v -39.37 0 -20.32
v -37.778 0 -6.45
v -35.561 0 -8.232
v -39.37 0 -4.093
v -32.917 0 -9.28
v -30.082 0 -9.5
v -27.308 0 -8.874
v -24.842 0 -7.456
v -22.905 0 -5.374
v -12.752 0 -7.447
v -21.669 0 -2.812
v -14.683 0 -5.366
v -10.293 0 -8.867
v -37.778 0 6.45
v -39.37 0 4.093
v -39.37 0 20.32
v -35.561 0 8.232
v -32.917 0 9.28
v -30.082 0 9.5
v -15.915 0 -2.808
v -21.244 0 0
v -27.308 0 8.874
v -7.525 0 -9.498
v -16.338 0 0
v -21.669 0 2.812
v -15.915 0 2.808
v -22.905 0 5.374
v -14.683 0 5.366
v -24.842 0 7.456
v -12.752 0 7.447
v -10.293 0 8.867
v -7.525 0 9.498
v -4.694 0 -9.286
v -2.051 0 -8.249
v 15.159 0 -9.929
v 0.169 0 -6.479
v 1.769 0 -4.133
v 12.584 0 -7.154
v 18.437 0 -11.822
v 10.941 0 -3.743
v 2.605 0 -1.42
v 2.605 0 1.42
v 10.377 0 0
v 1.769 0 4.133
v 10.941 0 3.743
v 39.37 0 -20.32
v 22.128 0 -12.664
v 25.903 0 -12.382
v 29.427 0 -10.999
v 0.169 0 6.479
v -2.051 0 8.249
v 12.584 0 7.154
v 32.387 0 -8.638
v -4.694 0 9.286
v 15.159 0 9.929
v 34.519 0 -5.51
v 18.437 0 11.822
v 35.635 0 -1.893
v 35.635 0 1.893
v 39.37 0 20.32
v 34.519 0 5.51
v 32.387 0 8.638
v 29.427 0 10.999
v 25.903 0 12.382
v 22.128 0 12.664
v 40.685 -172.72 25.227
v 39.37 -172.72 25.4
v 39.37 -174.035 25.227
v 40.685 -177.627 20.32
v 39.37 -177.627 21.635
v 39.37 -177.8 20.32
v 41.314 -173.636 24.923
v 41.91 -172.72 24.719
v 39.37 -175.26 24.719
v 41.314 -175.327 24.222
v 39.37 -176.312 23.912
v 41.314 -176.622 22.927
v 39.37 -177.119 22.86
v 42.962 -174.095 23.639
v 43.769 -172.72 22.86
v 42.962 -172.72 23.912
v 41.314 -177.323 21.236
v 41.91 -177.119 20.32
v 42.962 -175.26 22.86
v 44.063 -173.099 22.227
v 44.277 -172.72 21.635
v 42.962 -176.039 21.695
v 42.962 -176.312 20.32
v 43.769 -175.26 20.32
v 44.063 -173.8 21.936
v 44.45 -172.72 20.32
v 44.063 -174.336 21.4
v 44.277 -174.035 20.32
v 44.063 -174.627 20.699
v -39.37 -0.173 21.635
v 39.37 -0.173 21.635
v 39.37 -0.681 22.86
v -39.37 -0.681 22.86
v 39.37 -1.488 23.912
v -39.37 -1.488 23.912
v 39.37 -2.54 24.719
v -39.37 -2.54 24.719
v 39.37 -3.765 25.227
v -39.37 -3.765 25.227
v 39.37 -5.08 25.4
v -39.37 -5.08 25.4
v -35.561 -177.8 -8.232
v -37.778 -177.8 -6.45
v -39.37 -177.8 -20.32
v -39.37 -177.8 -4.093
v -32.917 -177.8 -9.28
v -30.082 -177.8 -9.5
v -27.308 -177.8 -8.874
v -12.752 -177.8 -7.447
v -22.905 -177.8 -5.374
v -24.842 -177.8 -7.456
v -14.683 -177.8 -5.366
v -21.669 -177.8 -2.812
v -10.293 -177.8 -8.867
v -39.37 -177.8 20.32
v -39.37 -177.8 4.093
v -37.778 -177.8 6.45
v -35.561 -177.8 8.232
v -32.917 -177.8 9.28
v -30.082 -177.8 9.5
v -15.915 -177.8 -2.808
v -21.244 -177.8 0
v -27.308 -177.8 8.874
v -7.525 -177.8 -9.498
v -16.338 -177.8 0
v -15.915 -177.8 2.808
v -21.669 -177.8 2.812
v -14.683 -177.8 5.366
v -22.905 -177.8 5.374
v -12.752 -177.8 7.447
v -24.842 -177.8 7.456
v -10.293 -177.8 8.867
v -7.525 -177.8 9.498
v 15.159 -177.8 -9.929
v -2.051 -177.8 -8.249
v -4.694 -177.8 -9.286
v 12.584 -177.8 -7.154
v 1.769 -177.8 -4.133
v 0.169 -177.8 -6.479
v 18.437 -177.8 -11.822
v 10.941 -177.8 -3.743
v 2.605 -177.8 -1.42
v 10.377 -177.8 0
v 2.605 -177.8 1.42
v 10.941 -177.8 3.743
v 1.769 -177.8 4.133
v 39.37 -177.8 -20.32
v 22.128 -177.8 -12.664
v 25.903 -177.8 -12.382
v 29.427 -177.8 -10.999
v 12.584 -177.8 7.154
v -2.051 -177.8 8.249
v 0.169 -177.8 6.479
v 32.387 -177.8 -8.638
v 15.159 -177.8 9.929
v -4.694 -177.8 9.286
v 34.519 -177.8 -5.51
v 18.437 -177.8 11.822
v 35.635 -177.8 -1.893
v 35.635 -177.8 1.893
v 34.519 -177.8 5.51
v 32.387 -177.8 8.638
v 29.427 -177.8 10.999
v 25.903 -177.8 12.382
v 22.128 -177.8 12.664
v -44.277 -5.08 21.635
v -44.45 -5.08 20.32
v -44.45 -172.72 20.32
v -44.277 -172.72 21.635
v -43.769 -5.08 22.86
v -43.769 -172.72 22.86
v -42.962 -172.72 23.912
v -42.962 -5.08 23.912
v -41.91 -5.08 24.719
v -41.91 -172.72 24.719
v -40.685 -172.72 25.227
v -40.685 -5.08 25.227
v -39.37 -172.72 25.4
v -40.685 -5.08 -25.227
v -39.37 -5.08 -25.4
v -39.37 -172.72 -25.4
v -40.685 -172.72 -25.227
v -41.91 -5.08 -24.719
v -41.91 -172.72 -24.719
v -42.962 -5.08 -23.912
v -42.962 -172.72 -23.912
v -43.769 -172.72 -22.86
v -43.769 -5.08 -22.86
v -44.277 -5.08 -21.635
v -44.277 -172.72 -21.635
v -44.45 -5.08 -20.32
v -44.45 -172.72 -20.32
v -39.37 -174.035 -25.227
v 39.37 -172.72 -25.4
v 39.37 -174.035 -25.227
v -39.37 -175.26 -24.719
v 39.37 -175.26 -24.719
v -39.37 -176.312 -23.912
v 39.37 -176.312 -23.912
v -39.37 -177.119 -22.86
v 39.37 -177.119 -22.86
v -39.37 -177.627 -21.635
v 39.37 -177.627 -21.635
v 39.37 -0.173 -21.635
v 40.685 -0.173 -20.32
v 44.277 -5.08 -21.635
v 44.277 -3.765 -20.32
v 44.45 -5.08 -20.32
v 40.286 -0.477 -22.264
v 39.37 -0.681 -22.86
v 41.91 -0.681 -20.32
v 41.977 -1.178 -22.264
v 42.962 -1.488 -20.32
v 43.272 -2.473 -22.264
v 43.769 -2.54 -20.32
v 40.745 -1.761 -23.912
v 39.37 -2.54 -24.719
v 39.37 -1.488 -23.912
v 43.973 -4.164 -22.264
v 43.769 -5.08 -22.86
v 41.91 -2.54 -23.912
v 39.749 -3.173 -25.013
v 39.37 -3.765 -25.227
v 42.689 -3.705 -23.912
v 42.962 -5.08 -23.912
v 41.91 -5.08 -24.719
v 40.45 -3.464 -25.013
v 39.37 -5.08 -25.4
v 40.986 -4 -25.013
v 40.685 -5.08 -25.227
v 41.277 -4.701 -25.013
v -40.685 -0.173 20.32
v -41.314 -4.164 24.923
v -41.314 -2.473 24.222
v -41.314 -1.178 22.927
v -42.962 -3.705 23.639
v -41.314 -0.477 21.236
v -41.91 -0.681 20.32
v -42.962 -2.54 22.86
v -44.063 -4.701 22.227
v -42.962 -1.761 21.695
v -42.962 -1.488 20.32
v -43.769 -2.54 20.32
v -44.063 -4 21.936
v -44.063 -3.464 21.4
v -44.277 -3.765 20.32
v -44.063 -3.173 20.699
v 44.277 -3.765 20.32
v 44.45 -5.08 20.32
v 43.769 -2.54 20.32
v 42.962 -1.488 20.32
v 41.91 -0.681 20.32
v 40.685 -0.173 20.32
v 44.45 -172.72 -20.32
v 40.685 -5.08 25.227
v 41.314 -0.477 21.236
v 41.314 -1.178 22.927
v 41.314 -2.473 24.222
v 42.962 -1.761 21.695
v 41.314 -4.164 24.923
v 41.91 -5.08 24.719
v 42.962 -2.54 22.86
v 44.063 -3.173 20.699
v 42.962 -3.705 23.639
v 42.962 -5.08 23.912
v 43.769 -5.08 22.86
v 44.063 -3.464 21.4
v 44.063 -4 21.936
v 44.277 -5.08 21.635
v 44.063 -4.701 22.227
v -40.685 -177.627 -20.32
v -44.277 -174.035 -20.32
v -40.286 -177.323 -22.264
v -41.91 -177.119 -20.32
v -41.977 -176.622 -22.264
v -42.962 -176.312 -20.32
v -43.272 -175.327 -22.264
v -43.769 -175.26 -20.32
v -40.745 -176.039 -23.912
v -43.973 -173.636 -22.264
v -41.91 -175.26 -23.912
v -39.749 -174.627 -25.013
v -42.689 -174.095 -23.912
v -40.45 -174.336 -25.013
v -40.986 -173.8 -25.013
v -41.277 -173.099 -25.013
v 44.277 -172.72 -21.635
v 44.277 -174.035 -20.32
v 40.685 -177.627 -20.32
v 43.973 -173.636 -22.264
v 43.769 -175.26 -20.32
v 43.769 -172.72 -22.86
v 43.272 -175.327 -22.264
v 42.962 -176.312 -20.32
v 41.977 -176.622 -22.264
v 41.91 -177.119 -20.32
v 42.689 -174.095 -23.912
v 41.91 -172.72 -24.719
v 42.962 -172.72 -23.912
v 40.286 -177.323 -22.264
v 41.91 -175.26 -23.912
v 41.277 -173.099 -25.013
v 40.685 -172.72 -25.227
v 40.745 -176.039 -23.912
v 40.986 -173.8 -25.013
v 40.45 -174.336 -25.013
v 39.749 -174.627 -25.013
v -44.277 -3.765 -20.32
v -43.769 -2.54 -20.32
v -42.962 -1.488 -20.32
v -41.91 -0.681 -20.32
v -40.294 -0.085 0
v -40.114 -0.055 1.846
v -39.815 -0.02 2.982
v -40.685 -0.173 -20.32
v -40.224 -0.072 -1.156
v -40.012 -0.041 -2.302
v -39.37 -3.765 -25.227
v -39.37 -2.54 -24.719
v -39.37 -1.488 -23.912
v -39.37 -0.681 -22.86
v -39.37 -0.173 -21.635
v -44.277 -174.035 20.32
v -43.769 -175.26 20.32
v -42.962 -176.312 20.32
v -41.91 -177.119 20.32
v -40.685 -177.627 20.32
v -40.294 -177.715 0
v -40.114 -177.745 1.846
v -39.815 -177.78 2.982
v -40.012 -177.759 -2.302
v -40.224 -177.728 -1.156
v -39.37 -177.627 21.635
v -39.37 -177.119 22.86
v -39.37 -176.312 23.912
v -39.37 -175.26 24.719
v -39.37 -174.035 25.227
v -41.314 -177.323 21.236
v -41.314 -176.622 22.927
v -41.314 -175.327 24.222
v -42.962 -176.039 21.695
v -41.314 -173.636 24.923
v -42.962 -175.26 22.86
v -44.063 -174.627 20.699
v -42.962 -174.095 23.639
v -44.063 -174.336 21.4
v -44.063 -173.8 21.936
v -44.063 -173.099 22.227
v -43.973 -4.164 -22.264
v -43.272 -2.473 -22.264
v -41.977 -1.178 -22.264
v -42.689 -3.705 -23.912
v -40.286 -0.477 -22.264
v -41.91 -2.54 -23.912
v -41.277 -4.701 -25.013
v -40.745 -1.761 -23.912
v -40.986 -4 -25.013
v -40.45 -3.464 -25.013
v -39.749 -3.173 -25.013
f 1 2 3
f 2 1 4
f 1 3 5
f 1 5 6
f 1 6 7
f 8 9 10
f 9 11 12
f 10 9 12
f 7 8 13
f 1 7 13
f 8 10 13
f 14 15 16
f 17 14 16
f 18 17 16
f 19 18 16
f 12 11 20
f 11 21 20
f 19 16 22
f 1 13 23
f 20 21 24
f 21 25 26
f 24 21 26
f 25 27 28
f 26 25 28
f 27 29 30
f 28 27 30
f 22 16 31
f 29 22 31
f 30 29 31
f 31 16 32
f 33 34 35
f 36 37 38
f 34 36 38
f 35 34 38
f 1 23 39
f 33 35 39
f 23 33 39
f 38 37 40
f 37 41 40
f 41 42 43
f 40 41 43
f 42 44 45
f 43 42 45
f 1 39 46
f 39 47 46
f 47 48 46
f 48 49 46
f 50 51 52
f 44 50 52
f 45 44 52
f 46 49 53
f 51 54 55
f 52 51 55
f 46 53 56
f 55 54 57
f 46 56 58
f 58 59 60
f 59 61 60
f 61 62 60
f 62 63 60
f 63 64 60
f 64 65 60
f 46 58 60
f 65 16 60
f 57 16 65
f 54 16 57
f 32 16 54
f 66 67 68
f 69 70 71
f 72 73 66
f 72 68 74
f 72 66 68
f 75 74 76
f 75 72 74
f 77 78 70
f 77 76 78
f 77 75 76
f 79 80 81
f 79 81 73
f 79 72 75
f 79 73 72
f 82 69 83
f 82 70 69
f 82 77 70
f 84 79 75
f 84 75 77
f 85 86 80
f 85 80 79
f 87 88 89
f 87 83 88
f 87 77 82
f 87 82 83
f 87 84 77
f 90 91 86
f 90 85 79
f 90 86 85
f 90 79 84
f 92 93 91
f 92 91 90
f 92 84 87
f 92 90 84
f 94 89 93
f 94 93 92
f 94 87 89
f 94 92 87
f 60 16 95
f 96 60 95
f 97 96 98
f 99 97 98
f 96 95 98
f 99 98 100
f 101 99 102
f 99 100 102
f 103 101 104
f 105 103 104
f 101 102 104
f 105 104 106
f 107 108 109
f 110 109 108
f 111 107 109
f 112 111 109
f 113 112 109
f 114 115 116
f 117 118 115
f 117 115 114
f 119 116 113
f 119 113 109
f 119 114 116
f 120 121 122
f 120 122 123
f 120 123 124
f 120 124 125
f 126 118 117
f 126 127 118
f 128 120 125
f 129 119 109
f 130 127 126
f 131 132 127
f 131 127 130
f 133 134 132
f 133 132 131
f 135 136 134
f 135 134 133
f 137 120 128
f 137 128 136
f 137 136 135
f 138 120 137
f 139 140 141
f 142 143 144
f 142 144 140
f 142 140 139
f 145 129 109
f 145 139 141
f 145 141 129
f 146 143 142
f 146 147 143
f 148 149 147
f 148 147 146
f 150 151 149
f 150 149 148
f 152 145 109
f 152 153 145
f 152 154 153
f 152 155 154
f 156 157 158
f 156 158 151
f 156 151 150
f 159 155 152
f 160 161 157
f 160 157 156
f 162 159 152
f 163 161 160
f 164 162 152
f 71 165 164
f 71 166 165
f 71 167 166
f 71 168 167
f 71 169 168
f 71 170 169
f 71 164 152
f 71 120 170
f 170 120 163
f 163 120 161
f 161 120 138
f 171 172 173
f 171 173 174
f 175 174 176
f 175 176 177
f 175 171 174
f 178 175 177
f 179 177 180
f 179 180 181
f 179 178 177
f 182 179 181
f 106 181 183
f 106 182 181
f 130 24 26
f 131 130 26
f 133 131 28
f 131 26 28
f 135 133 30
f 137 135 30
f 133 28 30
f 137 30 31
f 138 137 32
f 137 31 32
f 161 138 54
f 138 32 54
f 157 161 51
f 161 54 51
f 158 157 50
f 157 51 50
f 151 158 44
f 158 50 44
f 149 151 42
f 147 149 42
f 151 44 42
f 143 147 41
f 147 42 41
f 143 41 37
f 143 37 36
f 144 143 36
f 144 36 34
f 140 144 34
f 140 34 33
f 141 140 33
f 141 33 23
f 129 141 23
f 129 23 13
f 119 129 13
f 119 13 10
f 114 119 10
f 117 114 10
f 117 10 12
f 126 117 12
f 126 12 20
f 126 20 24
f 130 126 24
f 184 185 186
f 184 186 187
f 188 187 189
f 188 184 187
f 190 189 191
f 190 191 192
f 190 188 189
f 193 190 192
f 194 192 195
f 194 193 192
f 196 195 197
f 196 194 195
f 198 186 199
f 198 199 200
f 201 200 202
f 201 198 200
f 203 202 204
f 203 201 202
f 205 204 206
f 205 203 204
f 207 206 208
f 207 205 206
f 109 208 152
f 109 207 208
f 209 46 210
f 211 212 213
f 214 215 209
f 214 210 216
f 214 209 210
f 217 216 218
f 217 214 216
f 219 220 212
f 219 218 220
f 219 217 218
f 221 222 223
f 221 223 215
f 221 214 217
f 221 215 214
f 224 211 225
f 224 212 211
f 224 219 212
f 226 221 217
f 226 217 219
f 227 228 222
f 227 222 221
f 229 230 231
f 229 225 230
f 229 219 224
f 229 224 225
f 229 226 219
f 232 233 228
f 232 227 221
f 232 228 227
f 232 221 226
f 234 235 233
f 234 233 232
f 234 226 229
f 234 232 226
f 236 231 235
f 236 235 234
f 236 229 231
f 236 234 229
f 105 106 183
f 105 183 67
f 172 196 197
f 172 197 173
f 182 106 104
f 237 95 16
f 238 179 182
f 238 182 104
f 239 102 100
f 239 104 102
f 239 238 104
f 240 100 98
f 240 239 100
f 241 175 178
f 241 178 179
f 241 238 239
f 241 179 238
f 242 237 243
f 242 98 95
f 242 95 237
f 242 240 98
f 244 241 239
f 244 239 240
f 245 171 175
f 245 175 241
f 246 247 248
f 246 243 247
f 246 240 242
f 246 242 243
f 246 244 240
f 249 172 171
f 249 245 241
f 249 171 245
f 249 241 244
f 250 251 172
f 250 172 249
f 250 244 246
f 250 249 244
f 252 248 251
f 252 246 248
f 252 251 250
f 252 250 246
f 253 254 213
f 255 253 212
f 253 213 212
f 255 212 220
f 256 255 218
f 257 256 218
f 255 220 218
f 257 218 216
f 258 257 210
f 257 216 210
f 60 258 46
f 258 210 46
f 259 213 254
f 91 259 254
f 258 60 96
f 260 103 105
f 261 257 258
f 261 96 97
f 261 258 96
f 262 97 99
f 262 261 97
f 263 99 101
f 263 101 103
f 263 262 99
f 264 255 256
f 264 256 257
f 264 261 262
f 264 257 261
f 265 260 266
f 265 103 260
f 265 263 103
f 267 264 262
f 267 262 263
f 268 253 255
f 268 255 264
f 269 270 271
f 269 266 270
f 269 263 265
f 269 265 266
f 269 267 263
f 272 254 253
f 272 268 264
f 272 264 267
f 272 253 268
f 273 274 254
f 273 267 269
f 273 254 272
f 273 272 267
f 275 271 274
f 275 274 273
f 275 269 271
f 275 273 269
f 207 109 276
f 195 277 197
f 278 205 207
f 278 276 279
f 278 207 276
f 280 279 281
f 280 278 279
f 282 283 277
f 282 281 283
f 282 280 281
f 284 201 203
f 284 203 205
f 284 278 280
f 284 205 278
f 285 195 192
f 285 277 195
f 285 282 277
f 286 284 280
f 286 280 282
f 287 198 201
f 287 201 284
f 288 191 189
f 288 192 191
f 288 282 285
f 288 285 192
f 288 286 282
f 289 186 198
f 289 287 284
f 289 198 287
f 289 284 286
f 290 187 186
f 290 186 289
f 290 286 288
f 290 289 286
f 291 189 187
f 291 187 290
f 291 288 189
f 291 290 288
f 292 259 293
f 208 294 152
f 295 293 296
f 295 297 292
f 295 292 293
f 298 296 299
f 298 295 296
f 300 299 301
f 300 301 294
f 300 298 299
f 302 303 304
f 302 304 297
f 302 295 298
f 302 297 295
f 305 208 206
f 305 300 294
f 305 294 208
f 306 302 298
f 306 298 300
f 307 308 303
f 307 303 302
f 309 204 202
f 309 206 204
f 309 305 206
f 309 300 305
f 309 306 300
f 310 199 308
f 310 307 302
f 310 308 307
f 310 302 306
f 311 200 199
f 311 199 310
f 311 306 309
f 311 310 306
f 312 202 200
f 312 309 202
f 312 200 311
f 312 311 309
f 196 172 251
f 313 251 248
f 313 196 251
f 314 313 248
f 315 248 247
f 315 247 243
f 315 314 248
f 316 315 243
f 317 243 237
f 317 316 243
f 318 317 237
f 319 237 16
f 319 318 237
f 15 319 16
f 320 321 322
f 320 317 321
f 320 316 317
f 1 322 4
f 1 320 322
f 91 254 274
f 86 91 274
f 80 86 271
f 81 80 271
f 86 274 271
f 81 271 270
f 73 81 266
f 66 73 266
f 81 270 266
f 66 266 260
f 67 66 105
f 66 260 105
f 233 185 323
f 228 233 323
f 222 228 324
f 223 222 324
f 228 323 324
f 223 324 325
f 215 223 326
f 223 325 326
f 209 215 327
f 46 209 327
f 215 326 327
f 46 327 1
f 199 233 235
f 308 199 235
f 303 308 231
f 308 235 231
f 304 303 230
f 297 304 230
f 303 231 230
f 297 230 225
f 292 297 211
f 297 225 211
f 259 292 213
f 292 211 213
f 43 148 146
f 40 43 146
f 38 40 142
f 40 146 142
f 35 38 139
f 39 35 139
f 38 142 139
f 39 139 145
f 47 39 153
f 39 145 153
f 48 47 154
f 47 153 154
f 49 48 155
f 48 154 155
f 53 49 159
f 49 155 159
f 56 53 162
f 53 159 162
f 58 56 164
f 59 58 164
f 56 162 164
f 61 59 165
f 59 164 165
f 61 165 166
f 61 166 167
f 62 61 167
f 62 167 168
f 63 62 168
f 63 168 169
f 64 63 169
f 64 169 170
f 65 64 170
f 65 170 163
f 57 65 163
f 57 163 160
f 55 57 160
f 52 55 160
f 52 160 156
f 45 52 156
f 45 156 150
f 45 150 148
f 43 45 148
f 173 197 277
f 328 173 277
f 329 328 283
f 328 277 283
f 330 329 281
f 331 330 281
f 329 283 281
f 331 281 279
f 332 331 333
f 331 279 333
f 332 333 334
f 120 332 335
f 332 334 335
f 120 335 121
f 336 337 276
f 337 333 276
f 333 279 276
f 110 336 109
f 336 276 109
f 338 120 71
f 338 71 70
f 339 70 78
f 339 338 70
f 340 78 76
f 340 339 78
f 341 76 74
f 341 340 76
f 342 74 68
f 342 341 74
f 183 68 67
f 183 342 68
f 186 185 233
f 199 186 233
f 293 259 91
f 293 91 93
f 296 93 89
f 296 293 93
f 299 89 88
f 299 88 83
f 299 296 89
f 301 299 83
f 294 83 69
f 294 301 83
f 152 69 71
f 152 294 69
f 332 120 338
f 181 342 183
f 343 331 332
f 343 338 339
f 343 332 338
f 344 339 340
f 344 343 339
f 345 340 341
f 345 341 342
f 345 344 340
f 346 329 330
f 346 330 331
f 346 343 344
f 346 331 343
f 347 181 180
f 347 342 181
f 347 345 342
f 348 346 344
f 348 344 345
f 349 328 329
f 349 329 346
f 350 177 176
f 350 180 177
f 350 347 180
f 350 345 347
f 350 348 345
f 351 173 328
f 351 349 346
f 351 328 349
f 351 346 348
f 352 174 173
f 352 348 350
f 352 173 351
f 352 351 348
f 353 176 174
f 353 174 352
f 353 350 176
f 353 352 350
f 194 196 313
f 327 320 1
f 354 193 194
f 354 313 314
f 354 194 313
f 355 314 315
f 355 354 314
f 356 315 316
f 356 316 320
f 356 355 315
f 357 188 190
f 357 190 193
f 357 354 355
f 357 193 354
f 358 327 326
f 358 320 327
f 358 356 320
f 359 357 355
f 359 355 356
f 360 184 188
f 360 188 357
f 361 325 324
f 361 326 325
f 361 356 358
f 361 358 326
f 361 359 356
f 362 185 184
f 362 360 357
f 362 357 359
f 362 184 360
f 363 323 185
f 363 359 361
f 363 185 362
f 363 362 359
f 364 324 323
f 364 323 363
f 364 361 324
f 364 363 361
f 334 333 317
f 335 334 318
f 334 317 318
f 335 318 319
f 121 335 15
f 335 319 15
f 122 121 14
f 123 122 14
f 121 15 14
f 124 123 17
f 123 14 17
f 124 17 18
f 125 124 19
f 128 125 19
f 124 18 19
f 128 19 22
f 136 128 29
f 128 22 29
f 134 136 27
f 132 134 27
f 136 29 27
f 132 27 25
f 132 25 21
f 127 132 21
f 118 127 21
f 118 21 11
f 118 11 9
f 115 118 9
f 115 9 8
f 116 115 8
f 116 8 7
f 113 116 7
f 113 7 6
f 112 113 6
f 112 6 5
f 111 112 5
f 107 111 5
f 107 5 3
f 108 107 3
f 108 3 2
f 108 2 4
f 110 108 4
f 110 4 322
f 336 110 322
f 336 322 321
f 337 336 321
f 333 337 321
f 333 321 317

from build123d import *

# Parameters (mm, degrees)
F0_W         = 88.9
F0_H         = 50.8
F1_DEPTH     = 177.8
F3_D         = 19.05
F5_D         = 25.4
F6_T1_DEPTH  = 167.64
F6_T3_DEPTH  = 78.74
F6_T5_DEPTH  = 40.64
F6_S9_W      = 5.08
F6_S9_H      = 5.08
F6_T10_DEPTH = 5.08
F6_S15_W     = 5.08
F6_S15_H     = 5.08
F6_T16_DEPTH = 5.08
F6_S21_W     = 5.08
F6_S21_H     = 5.08
F6_T22_DEPTH = 5.08
F6_S27_W     = 5.08
F6_S27_H     = 5.08
F6_T28_DEPTH = 5.08
F6_S33_W     = 5.08
F6_S33_H     = 5.08
F6_T34_DEPTH = 5.08
F6_S39_W     = 5.08
F6_S39_H     = 5.08
F6_T40_DEPTH = 5.08
F6_S45_W     = 5.08
F6_S45_H     = 5.08
F6_T46_DEPTH = 5.08
F6_S51_W     = 5.08
F6_S51_H     = 5.08
F6_T52_DEPTH = 5.08


# Not quite as in the source:
# - a fillet or chamfer that OpenCascade refuses, or shapes differently, is made with other operations: its cross-section is extruded or revolved along the edge and cut away or added


with BuildPart() as f1:
    # F0 (on Front) → F1 (new body)
    with BuildSketch(Plane.XZ):
        Rectangle(F0_W, F0_H)
    extrude(amount=F1_DEPTH)

    # F3 (through all)
    with Locations(Plane.XZ.offset(177.8)):
        with Locations((-30.7692382485, 0), (-6.8131890148, 0)):
            Hole(F3_D / 2)

    # F5 (through all)
    with Locations(Plane(origin=(0, 0, 0), x_dir=(1, 0, 0), z_dir=(0, 1, 0))):
        with Locations((23.0769272894, 0)):
            Hole(F5_D / 2)

    # F6: fillet of radius 5.08 on 12 edges, made by hand

    # F6_s2 → F6_t1 (cut)
    with BuildSketch(Plane.XZ.offset(5.08)):
        with BuildLine():
            ThreePointArc((44.45, 20.32), (42.9621024484, 23.9121024484), (39.37, 25.4))
            Line((39.37, 25.4), (44.45, 25.4))
            Line((44.45, 25.4), (44.45, 20.32))
        make_face()
        with BuildLine():
            ThreePointArc((-44.45, 20.32), (-42.9621024484, 23.9121024484), (-39.37, 25.4))
            Line((-39.37, 25.4), (-44.45, 25.4))
            Line((-44.45, 25.4), (-44.45, 20.32))
        make_face()
        with BuildLine():
            ThreePointArc((39.37, -25.4), (42.9621024484, -23.9121024484), (44.45, -20.32))
            Line((44.45, -20.32), (44.45, -25.4))
            Line((44.45, -25.4), (39.37, -25.4))
        make_face()
        with BuildLine():
            ThreePointArc((-39.37, -25.4), (-42.9621024484, -23.9121024484), (-44.45, -20.32))
            Line((-44.45, -20.32), (-44.45, -25.4))
            Line((-44.45, -25.4), (-39.37, -25.4))
        make_face()
    extrude(amount=F6_T1_DEPTH, mode=Mode.SUBTRACT)

    # F6_s4 → F6_t3 (cut)
    with BuildSketch(Plane.YZ.offset(-39.37)):
        with BuildLine():
            ThreePointArc((0, 20.32), (-1.4878975516, 23.9121024484), (-5.08, 25.4))
            Line((-5.08, 25.4), (0, 25.4))
            Line((0, 25.4), (0, 20.32))
        make_face()
        with BuildLine():
            ThreePointArc((-177.8, 20.32), (-176.3121024484, 23.9121024484), (-172.72, 25.4))
            Line((-172.72, 25.4), (-177.8, 25.4))
            Line((-177.8, 25.4), (-177.8, 20.32))
        make_face()
        with BuildLine():
            ThreePointArc((-5.08, -25.4), (-1.4878975516, -23.9121024484), (0, -20.32))
            Line((0, -20.32), (0, -25.4))
            Line((0, -25.4), (-5.08, -25.4))
        make_face()
        with BuildLine():
            ThreePointArc((-172.72, -25.4), (-176.3121024484, -23.9121024484), (-177.8, -20.32))
            Line((-177.8, -20.32), (-177.8, -25.4))
            Line((-177.8, -25.4), (-172.72, -25.4))
        make_face()
    extrude(amount=F6_T3_DEPTH, mode=Mode.SUBTRACT)

    # F6_s6 → F6_t5 (cut)
    with BuildSketch(Plane.XY.offset(-20.32)):
        with BuildLine():
            ThreePointArc((44.45, -5.08), (42.9621024484, -1.4878975516), (39.37, 0))
            Line((39.37, 0), (44.45, 0))
            Line((44.45, 0), (44.45, -5.08))
        make_face()
        with BuildLine():
            ThreePointArc((44.45, -172.72), (42.9621024484, -176.3121024484), (39.37, -177.8))
            Line((39.37, -177.8), (44.45, -177.8))
            Line((44.45, -177.8), (44.45, -172.72))
        make_face()
        with BuildLine():
            ThreePointArc((-44.45, -5.08), (-42.9621024484, -1.4878975516), (-39.37, 0))
            Line((-39.37, 0), (-44.45, 0))
            Line((-44.45, 0), (-44.45, -5.08))
        make_face()
        with BuildLine():
            ThreePointArc((-44.45, -172.72), (-42.9621024484, -176.3121024484), (-39.37, -177.8))
            Line((-39.37, -177.8), (-44.45, -177.8))
            Line((-44.45, -177.8), (-44.45, -172.72))
        make_face()
    extrude(amount=F6_T5_DEPTH, mode=Mode.SUBTRACT)


with BuildPart() as f6_tool8:
    # F6_s9 → F6_t10 (new body)
    with BuildSketch(Plane.YZ.offset(39.37)):
        with Locations((-2.54, 22.86)):
            Rectangle(F6_S9_W, F6_S9_H)
    extrude(amount=F6_T10_DEPTH)

    # F6_s11 → F6_t12 (revolve, cut)
    with BuildSketch(Plane(origin=(39.37, -5.08, 20.32), x_dir=(0, -0.7071067812, -0.7071067812), z_dir=(0, -0.7071067812, 0.7071067812))):
        with BuildLine():
            ThreePointArc((0, -5.08), (5.08, 0), (0, 5.08))
            Line((0, 5.08), (0, -5.08))
        make_face()
    revolve(axis=Axis((39.37, -5.08, 20.32), (1, 0, 0)), mode=Mode.SUBTRACT)


with BuildPart() as f1_1:
    add(f1.part)

    # F6_t7: cut F6_tool8
    add(f6_tool8.part, mode=Mode.SUBTRACT)


with BuildPart() as f6_tool14:
    # F6_s15 → F6_t16 (new body)
    with BuildSketch(Plane.YZ.offset(39.37)):
        with Locations((-175.26, 22.86)):
            Rectangle(F6_S15_W, F6_S15_H)
    extrude(amount=F6_T16_DEPTH)

    # F6_s17 → F6_t18 (revolve, cut)
    with BuildSketch(Plane(origin=(39.37, -172.72, 20.32), x_dir=(0, 0.7071067812, -0.7071067812), z_dir=(0, -0.7071067812, -0.7071067812))):
        with BuildLine():
            ThreePointArc((0, -5.08), (5.08, 0), (0, 5.08))
            Line((0, 5.08), (0, -5.08))
        make_face()
    revolve(axis=Axis((39.37, -172.72, 20.32), (1, 0, 0)), mode=Mode.SUBTRACT)


with BuildPart() as f1_2:
    add(f1_1.part)

    # F6_t13: cut F6_tool14
    add(f6_tool14.part, mode=Mode.SUBTRACT)


with BuildPart() as f6_tool20:
    # F6_s21 → F6_t22 (new body)
    with BuildSketch(Plane.YZ.offset(-39.37)):
        with Locations((-2.54, 22.86)):
            Rectangle(F6_S21_W, F6_S21_H)
    extrude(amount=-F6_T22_DEPTH)

    # F6_s23 → F6_t24 (revolve, cut)
    with BuildSketch(Plane(origin=(-39.37, -5.08, 20.32), x_dir=(0, -0.7071067812, -0.7071067812), z_dir=(0, 0.7071067812, -0.7071067812))):
        with BuildLine():
            ThreePointArc((0, -5.08), (5.08, 0), (0, 5.08))
            Line((0, 5.08), (0, -5.08))
        make_face()
    revolve(axis=Axis((-39.37, -5.08, 20.32), (-1, 0, 0)), mode=Mode.SUBTRACT)


with BuildPart() as f1_3:
    add(f1_2.part)

    # F6_t19: cut F6_tool20
    add(f6_tool20.part, mode=Mode.SUBTRACT)


with BuildPart() as f6_tool26:
    # F6_s27 → F6_t28 (new body)
    with BuildSketch(Plane.YZ.offset(-39.37)):
        with Locations((-175.26, 22.86)):
            Rectangle(F6_S27_W, F6_S27_H)
    extrude(amount=-F6_T28_DEPTH)

    # F6_s29 → F6_t30 (revolve, cut)
    with BuildSketch(Plane(origin=(-39.37, -172.72, 20.32), x_dir=(0, 0.7071067812, -0.7071067812), z_dir=(0, 0.7071067812, 0.7071067812))):
        with BuildLine():
            ThreePointArc((0, -5.08), (5.08, 0), (0, 5.08))
            Line((0, 5.08), (0, -5.08))
        make_face()
    revolve(axis=Axis((-39.37, -172.72, 20.32), (-1, 0, 0)), mode=Mode.SUBTRACT)


with BuildPart() as f1_4:
    add(f1_3.part)

    # F6_t25: cut F6_tool26
    add(f6_tool26.part, mode=Mode.SUBTRACT)


with BuildPart() as f6_tool32:
    # F6_s33 → F6_t34 (new body)
    with BuildSketch(Plane.XY.offset(-20.32)):
        with Locations((41.91, -2.54)):
            Rectangle(F6_S33_W, F6_S33_H)
    extrude(amount=-F6_T34_DEPTH)

    # F6_s35 → F6_t36 (revolve, cut)
    with BuildSketch(Plane(origin=(39.37, -5.08, -20.32), x_dir=(-0.7071067812, -0.7071067812, 0), z_dir=(0.7071067812, -0.7071067812, 0))):
        with BuildLine():
            ThreePointArc((0, -5.08), (5.08, 0), (0, 5.08))
            Line((0, 5.08), (0, -5.08))
        make_face()
    revolve(axis=Axis((39.37, -5.08, -20.32), (0, 0, -1)), mode=Mode.SUBTRACT)


with BuildPart() as f1_5:
    add(f1_4.part)

    # F6_t31: cut F6_tool32
    add(f6_tool32.part, mode=Mode.SUBTRACT)


with BuildPart() as f6_tool38:
    # F6_s39 → F6_t40 (new body)
    with BuildSketch(Plane.XY.offset(-20.32)):
        with Locations((41.91, -175.26)):
            Rectangle(F6_S39_W, F6_S39_H)
    extrude(amount=-F6_T40_DEPTH)

    # F6_s41 → F6_t42 (revolve, cut)
    with BuildSketch(Plane(origin=(39.37, -172.72, -20.32), x_dir=(-0.7071067812, 0.7071067812, 0), z_dir=(-0.7071067812, -0.7071067812, 0))):
        with BuildLine():
            ThreePointArc((0, -5.08), (5.08, 0), (0, 5.08))
            Line((0, 5.08), (0, -5.08))
        make_face()
    revolve(axis=Axis((39.37, -172.72, -20.32), (0, 0, -1)), mode=Mode.SUBTRACT)


with BuildPart() as f1_6:
    add(f1_5.part)

    # F6_t37: cut F6_tool38
    add(f6_tool38.part, mode=Mode.SUBTRACT)


with BuildPart() as f6_tool44:
    # F6_s45 → F6_t46 (new body)
    with BuildSketch(Plane.XY.offset(-20.32)):
        with Locations((-41.91, -2.54)):
            Rectangle(F6_S45_W, F6_S45_H)
    extrude(amount=-F6_T46_DEPTH)

    # F6_s47 → F6_t48 (revolve, cut)
    with BuildSketch(Plane(origin=(-39.37, -5.08, -20.32), x_dir=(0.7071067812, -0.7071067812, 0), z_dir=(0.7071067812, 0.7071067812, 0))):
        with BuildLine():
            ThreePointArc((0, -5.08), (5.08, 0), (0, 5.08))
            Line((0, 5.08), (0, -5.08))
        make_face()
    revolve(axis=Axis((-39.37, -5.08, -20.32), (0, 0, -1)), mode=Mode.SUBTRACT)


with BuildPart() as f1_7:
    add(f1_6.part)

    # F6_t43: cut F6_tool44
    add(f6_tool44.part, mode=Mode.SUBTRACT)


with BuildPart() as f6_tool50:
    # F6_s51 → F6_t52 (new body)
    with BuildSketch(Plane.XY.offset(-20.32)):
        with Locations((-41.91, -175.26)):
            Rectangle(F6_S51_W, F6_S51_H)
    extrude(amount=-F6_T52_DEPTH)

    # F6_s53 → F6_t54 (revolve, cut)
    with BuildSketch(Plane(origin=(-39.37, -172.72, -20.32), x_dir=(0.7071067812, 0.7071067812, 0), z_dir=(-0.7071067812, 0.7071067812, 0))):
        with BuildLine():
            ThreePointArc((0, -5.08), (5.08, 0), (0, 5.08))
            Line((0, 5.08), (0, -5.08))
        make_face()
    revolve(axis=Axis((-39.37, -172.72, -20.32), (0, 0, -1)), mode=Mode.SUBTRACT)


with BuildPart() as f1_8:
    add(f1_7.part)

    # F6_t49: cut F6_tool50
    add(f6_tool50.part, mode=Mode.SUBTRACT)


solid = f1_8.part
